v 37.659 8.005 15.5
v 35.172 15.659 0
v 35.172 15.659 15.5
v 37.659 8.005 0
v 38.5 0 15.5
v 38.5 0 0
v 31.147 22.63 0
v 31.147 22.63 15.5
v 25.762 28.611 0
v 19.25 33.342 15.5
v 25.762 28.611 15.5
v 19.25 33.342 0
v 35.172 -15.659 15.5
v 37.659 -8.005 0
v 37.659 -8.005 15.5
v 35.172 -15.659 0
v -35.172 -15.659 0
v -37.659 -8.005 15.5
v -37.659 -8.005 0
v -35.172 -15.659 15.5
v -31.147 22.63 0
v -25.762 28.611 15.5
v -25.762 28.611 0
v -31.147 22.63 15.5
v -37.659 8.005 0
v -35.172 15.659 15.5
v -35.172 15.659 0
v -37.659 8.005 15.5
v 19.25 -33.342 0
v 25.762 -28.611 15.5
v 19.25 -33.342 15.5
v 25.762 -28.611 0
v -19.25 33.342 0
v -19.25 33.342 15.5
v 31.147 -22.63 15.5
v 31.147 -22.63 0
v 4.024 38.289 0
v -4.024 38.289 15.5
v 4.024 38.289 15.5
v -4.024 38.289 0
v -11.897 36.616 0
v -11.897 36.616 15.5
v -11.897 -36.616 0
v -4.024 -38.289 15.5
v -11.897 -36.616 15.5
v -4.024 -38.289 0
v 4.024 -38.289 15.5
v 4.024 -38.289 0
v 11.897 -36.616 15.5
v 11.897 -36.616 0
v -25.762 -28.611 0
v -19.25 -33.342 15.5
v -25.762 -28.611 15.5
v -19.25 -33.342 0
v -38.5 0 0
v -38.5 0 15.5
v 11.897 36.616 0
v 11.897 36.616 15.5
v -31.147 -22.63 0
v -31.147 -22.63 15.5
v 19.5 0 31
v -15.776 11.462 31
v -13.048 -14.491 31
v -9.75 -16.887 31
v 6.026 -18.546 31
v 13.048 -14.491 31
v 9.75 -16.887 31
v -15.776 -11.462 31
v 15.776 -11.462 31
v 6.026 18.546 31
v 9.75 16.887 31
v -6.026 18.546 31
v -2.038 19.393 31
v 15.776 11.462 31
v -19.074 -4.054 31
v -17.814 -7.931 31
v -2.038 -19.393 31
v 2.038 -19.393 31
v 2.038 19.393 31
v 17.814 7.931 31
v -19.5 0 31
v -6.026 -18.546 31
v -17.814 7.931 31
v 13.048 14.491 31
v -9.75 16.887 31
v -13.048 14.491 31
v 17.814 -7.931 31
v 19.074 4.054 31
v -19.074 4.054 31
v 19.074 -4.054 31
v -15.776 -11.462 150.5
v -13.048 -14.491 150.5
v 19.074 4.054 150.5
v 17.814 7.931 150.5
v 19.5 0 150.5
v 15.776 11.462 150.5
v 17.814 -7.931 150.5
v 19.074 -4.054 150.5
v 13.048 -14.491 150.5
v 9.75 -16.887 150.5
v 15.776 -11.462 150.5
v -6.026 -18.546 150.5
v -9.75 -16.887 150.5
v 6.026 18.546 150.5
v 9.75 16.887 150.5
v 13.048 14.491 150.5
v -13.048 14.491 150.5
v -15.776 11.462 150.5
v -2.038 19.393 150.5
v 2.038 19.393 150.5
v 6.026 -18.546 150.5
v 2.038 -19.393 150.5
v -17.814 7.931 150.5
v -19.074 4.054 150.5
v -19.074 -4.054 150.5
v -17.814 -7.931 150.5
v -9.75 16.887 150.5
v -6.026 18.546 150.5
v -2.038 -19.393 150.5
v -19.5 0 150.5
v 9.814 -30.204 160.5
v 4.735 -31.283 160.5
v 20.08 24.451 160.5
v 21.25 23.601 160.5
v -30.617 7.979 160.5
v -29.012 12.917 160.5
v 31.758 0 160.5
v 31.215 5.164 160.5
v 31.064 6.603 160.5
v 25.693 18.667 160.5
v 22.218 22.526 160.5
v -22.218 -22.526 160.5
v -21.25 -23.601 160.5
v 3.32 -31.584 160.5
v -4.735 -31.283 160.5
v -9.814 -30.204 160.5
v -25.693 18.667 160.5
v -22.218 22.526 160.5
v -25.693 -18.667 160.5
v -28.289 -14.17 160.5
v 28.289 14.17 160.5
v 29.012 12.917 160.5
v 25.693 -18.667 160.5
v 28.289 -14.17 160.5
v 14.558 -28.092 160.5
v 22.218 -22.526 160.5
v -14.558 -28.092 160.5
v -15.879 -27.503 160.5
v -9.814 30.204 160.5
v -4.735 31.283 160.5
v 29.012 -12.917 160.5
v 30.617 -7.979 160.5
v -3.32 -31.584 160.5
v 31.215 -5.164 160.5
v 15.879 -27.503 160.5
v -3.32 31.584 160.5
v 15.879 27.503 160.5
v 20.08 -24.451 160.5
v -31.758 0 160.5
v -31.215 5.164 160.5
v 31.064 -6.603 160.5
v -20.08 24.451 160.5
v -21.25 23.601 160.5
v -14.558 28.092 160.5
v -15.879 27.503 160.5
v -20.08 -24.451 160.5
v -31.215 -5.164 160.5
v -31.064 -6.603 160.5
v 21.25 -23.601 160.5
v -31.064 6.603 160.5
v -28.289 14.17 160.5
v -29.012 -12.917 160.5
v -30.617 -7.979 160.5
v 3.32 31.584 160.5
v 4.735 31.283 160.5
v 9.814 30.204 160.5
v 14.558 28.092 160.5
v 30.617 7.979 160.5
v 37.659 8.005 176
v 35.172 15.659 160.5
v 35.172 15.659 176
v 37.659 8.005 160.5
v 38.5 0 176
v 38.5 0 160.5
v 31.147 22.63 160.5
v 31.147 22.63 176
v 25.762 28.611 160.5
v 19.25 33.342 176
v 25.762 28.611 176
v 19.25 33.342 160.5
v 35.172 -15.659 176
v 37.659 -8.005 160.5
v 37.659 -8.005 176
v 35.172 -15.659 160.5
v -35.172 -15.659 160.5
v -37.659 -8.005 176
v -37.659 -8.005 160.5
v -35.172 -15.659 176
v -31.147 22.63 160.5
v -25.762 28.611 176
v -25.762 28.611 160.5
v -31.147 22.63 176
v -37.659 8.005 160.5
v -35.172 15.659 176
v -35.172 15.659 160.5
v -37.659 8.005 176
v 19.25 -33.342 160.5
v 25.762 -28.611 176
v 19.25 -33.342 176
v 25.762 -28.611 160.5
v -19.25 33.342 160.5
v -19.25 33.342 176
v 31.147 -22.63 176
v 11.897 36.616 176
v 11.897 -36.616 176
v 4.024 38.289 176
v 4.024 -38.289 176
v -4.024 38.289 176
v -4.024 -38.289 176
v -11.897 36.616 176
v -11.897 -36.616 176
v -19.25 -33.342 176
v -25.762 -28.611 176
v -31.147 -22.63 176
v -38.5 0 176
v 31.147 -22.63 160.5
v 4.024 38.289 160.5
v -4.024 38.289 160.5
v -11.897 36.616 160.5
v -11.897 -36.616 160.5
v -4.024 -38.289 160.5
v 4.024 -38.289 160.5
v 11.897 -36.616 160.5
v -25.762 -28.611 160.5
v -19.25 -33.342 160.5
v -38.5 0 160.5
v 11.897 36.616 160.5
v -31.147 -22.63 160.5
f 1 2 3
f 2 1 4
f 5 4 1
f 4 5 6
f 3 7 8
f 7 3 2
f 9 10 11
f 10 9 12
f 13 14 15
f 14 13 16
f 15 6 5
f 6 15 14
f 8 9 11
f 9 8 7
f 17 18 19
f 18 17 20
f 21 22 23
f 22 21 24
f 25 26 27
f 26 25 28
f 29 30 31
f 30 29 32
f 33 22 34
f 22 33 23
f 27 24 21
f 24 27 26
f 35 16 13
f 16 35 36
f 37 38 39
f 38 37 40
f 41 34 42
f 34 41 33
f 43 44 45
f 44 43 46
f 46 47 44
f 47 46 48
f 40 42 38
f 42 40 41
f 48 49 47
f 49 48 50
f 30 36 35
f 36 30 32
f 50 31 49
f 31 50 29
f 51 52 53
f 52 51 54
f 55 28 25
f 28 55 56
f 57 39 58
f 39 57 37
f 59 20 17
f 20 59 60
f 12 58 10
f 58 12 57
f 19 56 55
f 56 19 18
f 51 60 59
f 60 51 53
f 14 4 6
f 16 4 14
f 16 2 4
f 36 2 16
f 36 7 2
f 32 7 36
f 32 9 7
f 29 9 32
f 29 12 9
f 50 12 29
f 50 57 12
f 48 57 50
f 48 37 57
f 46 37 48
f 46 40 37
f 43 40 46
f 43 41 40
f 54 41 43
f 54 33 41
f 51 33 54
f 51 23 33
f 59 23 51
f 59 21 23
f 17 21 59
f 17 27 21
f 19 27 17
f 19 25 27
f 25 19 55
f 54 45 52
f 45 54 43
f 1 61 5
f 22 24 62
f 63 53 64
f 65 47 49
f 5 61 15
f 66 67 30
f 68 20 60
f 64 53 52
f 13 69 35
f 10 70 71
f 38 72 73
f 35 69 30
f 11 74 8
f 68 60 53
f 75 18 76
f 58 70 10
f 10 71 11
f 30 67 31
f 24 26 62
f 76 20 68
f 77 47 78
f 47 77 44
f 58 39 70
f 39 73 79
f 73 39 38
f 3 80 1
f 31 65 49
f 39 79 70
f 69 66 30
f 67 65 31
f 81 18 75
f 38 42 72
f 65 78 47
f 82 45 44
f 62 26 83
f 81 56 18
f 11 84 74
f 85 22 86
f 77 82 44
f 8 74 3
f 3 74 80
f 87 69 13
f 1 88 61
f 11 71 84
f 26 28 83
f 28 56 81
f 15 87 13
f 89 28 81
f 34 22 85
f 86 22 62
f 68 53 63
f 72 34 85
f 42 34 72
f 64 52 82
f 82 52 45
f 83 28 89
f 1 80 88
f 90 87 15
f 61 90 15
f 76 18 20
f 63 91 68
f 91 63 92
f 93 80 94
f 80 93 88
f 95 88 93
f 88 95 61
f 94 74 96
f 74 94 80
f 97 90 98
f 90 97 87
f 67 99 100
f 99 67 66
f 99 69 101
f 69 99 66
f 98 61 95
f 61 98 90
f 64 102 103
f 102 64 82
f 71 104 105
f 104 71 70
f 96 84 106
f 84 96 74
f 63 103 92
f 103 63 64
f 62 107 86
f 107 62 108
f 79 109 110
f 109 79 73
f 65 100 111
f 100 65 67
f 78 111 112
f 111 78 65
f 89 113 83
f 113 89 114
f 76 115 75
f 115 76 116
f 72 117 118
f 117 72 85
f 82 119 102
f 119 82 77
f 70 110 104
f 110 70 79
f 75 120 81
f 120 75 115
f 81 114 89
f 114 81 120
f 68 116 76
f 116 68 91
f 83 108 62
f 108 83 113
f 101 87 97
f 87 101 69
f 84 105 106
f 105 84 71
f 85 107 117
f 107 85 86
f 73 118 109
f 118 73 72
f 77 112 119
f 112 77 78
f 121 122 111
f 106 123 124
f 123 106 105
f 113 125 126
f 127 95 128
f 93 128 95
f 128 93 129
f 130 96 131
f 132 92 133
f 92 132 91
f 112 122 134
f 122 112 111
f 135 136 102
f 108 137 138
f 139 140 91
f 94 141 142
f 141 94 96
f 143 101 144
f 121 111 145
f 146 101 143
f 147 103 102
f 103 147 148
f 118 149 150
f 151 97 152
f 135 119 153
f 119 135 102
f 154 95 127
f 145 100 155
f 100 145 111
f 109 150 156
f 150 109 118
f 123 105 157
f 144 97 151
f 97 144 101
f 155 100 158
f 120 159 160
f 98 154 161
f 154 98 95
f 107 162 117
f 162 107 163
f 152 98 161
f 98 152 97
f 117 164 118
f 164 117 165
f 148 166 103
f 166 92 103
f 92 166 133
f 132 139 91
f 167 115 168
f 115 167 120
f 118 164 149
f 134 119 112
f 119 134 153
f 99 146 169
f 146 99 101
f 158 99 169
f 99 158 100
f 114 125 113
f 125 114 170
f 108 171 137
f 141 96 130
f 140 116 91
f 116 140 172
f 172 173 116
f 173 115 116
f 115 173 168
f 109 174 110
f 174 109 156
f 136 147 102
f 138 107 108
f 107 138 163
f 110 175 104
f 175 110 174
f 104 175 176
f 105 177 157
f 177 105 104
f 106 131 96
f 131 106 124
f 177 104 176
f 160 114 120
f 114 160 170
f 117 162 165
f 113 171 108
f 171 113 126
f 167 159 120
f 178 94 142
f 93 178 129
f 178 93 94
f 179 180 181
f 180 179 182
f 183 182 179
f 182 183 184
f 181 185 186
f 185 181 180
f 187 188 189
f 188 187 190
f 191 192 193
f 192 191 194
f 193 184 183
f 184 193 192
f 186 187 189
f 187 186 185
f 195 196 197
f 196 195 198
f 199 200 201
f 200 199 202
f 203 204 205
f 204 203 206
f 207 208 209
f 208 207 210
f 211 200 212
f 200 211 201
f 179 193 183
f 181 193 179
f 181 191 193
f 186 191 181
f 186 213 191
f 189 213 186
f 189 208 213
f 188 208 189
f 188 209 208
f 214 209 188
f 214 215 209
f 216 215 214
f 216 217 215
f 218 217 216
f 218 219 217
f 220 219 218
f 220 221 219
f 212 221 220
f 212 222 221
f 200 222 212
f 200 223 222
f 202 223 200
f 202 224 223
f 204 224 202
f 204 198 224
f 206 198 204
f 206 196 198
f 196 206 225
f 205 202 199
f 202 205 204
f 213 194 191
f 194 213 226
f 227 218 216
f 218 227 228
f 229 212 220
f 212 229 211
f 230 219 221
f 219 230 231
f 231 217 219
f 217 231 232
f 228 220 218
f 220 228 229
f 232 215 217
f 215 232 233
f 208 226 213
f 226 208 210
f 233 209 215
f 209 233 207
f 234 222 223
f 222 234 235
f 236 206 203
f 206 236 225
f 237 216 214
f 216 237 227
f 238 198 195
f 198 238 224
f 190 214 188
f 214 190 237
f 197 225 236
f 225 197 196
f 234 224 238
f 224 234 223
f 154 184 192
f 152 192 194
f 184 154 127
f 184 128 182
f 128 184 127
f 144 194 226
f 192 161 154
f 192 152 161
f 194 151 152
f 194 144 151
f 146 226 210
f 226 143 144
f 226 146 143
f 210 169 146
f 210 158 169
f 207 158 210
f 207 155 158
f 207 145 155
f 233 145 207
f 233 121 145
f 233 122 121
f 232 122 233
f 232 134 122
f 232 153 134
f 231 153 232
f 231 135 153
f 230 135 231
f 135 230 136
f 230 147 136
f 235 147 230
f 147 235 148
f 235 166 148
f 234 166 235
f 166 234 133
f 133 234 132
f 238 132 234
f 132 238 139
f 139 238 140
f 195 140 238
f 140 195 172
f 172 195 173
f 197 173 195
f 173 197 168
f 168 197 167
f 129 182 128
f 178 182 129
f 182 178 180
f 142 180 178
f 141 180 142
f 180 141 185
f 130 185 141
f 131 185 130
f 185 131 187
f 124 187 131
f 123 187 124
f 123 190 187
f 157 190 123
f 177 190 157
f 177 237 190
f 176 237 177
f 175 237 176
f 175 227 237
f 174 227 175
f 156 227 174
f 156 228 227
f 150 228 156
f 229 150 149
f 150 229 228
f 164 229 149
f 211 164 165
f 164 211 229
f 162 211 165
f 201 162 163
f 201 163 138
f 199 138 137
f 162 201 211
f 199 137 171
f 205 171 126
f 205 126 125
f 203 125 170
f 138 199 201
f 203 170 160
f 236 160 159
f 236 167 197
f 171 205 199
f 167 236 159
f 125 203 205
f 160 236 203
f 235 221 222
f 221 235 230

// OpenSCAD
/*
Filament spool spindle
(C) 2024 - nomike[at]nomike[dot]com

This program is free software: you can redistribute it and/or modify
it under the terms of the GNU General Public License as published by
the Free Software Foundation, either version 3 of the License, or
(at your option) any later version.

This program is distributed in the hope that it will be useful,
but WITHOUT ANY WARRANTY; without even the implied warranty of
MERCHANTABILITY or FITNESS FOR A PARTICULAR PURPOSE.  See the
GNU General Public License for more details.

You should have received a copy of the GNU General Public License
along with this program.  If not, see <https://www.gnu.org/licenses/>.
*/

small_diameter = 19.5;
large_diameter = 38.5;
large_length = 15.5;
slope_length = 10;
spool_width = 125;

cylinder(h=large_length, r=large_diameter);
translate([0, 0, large_length]) cylinder(h=large_length, r1=large_diameter, r2=small_diameter);
translate([0, 0, large_length + slope_length]) cylinder(h=spool_width, r=small_diameter);
translate([0, 0, large_length + slope_length + spool_width]) cylinder(h=large_length, r1=small_diameter, r2=large_diameter);
translate([0, 0, large_length + slope_length + spool_width + slope_length]) cylinder(h=large_length, r=large_diameter);
